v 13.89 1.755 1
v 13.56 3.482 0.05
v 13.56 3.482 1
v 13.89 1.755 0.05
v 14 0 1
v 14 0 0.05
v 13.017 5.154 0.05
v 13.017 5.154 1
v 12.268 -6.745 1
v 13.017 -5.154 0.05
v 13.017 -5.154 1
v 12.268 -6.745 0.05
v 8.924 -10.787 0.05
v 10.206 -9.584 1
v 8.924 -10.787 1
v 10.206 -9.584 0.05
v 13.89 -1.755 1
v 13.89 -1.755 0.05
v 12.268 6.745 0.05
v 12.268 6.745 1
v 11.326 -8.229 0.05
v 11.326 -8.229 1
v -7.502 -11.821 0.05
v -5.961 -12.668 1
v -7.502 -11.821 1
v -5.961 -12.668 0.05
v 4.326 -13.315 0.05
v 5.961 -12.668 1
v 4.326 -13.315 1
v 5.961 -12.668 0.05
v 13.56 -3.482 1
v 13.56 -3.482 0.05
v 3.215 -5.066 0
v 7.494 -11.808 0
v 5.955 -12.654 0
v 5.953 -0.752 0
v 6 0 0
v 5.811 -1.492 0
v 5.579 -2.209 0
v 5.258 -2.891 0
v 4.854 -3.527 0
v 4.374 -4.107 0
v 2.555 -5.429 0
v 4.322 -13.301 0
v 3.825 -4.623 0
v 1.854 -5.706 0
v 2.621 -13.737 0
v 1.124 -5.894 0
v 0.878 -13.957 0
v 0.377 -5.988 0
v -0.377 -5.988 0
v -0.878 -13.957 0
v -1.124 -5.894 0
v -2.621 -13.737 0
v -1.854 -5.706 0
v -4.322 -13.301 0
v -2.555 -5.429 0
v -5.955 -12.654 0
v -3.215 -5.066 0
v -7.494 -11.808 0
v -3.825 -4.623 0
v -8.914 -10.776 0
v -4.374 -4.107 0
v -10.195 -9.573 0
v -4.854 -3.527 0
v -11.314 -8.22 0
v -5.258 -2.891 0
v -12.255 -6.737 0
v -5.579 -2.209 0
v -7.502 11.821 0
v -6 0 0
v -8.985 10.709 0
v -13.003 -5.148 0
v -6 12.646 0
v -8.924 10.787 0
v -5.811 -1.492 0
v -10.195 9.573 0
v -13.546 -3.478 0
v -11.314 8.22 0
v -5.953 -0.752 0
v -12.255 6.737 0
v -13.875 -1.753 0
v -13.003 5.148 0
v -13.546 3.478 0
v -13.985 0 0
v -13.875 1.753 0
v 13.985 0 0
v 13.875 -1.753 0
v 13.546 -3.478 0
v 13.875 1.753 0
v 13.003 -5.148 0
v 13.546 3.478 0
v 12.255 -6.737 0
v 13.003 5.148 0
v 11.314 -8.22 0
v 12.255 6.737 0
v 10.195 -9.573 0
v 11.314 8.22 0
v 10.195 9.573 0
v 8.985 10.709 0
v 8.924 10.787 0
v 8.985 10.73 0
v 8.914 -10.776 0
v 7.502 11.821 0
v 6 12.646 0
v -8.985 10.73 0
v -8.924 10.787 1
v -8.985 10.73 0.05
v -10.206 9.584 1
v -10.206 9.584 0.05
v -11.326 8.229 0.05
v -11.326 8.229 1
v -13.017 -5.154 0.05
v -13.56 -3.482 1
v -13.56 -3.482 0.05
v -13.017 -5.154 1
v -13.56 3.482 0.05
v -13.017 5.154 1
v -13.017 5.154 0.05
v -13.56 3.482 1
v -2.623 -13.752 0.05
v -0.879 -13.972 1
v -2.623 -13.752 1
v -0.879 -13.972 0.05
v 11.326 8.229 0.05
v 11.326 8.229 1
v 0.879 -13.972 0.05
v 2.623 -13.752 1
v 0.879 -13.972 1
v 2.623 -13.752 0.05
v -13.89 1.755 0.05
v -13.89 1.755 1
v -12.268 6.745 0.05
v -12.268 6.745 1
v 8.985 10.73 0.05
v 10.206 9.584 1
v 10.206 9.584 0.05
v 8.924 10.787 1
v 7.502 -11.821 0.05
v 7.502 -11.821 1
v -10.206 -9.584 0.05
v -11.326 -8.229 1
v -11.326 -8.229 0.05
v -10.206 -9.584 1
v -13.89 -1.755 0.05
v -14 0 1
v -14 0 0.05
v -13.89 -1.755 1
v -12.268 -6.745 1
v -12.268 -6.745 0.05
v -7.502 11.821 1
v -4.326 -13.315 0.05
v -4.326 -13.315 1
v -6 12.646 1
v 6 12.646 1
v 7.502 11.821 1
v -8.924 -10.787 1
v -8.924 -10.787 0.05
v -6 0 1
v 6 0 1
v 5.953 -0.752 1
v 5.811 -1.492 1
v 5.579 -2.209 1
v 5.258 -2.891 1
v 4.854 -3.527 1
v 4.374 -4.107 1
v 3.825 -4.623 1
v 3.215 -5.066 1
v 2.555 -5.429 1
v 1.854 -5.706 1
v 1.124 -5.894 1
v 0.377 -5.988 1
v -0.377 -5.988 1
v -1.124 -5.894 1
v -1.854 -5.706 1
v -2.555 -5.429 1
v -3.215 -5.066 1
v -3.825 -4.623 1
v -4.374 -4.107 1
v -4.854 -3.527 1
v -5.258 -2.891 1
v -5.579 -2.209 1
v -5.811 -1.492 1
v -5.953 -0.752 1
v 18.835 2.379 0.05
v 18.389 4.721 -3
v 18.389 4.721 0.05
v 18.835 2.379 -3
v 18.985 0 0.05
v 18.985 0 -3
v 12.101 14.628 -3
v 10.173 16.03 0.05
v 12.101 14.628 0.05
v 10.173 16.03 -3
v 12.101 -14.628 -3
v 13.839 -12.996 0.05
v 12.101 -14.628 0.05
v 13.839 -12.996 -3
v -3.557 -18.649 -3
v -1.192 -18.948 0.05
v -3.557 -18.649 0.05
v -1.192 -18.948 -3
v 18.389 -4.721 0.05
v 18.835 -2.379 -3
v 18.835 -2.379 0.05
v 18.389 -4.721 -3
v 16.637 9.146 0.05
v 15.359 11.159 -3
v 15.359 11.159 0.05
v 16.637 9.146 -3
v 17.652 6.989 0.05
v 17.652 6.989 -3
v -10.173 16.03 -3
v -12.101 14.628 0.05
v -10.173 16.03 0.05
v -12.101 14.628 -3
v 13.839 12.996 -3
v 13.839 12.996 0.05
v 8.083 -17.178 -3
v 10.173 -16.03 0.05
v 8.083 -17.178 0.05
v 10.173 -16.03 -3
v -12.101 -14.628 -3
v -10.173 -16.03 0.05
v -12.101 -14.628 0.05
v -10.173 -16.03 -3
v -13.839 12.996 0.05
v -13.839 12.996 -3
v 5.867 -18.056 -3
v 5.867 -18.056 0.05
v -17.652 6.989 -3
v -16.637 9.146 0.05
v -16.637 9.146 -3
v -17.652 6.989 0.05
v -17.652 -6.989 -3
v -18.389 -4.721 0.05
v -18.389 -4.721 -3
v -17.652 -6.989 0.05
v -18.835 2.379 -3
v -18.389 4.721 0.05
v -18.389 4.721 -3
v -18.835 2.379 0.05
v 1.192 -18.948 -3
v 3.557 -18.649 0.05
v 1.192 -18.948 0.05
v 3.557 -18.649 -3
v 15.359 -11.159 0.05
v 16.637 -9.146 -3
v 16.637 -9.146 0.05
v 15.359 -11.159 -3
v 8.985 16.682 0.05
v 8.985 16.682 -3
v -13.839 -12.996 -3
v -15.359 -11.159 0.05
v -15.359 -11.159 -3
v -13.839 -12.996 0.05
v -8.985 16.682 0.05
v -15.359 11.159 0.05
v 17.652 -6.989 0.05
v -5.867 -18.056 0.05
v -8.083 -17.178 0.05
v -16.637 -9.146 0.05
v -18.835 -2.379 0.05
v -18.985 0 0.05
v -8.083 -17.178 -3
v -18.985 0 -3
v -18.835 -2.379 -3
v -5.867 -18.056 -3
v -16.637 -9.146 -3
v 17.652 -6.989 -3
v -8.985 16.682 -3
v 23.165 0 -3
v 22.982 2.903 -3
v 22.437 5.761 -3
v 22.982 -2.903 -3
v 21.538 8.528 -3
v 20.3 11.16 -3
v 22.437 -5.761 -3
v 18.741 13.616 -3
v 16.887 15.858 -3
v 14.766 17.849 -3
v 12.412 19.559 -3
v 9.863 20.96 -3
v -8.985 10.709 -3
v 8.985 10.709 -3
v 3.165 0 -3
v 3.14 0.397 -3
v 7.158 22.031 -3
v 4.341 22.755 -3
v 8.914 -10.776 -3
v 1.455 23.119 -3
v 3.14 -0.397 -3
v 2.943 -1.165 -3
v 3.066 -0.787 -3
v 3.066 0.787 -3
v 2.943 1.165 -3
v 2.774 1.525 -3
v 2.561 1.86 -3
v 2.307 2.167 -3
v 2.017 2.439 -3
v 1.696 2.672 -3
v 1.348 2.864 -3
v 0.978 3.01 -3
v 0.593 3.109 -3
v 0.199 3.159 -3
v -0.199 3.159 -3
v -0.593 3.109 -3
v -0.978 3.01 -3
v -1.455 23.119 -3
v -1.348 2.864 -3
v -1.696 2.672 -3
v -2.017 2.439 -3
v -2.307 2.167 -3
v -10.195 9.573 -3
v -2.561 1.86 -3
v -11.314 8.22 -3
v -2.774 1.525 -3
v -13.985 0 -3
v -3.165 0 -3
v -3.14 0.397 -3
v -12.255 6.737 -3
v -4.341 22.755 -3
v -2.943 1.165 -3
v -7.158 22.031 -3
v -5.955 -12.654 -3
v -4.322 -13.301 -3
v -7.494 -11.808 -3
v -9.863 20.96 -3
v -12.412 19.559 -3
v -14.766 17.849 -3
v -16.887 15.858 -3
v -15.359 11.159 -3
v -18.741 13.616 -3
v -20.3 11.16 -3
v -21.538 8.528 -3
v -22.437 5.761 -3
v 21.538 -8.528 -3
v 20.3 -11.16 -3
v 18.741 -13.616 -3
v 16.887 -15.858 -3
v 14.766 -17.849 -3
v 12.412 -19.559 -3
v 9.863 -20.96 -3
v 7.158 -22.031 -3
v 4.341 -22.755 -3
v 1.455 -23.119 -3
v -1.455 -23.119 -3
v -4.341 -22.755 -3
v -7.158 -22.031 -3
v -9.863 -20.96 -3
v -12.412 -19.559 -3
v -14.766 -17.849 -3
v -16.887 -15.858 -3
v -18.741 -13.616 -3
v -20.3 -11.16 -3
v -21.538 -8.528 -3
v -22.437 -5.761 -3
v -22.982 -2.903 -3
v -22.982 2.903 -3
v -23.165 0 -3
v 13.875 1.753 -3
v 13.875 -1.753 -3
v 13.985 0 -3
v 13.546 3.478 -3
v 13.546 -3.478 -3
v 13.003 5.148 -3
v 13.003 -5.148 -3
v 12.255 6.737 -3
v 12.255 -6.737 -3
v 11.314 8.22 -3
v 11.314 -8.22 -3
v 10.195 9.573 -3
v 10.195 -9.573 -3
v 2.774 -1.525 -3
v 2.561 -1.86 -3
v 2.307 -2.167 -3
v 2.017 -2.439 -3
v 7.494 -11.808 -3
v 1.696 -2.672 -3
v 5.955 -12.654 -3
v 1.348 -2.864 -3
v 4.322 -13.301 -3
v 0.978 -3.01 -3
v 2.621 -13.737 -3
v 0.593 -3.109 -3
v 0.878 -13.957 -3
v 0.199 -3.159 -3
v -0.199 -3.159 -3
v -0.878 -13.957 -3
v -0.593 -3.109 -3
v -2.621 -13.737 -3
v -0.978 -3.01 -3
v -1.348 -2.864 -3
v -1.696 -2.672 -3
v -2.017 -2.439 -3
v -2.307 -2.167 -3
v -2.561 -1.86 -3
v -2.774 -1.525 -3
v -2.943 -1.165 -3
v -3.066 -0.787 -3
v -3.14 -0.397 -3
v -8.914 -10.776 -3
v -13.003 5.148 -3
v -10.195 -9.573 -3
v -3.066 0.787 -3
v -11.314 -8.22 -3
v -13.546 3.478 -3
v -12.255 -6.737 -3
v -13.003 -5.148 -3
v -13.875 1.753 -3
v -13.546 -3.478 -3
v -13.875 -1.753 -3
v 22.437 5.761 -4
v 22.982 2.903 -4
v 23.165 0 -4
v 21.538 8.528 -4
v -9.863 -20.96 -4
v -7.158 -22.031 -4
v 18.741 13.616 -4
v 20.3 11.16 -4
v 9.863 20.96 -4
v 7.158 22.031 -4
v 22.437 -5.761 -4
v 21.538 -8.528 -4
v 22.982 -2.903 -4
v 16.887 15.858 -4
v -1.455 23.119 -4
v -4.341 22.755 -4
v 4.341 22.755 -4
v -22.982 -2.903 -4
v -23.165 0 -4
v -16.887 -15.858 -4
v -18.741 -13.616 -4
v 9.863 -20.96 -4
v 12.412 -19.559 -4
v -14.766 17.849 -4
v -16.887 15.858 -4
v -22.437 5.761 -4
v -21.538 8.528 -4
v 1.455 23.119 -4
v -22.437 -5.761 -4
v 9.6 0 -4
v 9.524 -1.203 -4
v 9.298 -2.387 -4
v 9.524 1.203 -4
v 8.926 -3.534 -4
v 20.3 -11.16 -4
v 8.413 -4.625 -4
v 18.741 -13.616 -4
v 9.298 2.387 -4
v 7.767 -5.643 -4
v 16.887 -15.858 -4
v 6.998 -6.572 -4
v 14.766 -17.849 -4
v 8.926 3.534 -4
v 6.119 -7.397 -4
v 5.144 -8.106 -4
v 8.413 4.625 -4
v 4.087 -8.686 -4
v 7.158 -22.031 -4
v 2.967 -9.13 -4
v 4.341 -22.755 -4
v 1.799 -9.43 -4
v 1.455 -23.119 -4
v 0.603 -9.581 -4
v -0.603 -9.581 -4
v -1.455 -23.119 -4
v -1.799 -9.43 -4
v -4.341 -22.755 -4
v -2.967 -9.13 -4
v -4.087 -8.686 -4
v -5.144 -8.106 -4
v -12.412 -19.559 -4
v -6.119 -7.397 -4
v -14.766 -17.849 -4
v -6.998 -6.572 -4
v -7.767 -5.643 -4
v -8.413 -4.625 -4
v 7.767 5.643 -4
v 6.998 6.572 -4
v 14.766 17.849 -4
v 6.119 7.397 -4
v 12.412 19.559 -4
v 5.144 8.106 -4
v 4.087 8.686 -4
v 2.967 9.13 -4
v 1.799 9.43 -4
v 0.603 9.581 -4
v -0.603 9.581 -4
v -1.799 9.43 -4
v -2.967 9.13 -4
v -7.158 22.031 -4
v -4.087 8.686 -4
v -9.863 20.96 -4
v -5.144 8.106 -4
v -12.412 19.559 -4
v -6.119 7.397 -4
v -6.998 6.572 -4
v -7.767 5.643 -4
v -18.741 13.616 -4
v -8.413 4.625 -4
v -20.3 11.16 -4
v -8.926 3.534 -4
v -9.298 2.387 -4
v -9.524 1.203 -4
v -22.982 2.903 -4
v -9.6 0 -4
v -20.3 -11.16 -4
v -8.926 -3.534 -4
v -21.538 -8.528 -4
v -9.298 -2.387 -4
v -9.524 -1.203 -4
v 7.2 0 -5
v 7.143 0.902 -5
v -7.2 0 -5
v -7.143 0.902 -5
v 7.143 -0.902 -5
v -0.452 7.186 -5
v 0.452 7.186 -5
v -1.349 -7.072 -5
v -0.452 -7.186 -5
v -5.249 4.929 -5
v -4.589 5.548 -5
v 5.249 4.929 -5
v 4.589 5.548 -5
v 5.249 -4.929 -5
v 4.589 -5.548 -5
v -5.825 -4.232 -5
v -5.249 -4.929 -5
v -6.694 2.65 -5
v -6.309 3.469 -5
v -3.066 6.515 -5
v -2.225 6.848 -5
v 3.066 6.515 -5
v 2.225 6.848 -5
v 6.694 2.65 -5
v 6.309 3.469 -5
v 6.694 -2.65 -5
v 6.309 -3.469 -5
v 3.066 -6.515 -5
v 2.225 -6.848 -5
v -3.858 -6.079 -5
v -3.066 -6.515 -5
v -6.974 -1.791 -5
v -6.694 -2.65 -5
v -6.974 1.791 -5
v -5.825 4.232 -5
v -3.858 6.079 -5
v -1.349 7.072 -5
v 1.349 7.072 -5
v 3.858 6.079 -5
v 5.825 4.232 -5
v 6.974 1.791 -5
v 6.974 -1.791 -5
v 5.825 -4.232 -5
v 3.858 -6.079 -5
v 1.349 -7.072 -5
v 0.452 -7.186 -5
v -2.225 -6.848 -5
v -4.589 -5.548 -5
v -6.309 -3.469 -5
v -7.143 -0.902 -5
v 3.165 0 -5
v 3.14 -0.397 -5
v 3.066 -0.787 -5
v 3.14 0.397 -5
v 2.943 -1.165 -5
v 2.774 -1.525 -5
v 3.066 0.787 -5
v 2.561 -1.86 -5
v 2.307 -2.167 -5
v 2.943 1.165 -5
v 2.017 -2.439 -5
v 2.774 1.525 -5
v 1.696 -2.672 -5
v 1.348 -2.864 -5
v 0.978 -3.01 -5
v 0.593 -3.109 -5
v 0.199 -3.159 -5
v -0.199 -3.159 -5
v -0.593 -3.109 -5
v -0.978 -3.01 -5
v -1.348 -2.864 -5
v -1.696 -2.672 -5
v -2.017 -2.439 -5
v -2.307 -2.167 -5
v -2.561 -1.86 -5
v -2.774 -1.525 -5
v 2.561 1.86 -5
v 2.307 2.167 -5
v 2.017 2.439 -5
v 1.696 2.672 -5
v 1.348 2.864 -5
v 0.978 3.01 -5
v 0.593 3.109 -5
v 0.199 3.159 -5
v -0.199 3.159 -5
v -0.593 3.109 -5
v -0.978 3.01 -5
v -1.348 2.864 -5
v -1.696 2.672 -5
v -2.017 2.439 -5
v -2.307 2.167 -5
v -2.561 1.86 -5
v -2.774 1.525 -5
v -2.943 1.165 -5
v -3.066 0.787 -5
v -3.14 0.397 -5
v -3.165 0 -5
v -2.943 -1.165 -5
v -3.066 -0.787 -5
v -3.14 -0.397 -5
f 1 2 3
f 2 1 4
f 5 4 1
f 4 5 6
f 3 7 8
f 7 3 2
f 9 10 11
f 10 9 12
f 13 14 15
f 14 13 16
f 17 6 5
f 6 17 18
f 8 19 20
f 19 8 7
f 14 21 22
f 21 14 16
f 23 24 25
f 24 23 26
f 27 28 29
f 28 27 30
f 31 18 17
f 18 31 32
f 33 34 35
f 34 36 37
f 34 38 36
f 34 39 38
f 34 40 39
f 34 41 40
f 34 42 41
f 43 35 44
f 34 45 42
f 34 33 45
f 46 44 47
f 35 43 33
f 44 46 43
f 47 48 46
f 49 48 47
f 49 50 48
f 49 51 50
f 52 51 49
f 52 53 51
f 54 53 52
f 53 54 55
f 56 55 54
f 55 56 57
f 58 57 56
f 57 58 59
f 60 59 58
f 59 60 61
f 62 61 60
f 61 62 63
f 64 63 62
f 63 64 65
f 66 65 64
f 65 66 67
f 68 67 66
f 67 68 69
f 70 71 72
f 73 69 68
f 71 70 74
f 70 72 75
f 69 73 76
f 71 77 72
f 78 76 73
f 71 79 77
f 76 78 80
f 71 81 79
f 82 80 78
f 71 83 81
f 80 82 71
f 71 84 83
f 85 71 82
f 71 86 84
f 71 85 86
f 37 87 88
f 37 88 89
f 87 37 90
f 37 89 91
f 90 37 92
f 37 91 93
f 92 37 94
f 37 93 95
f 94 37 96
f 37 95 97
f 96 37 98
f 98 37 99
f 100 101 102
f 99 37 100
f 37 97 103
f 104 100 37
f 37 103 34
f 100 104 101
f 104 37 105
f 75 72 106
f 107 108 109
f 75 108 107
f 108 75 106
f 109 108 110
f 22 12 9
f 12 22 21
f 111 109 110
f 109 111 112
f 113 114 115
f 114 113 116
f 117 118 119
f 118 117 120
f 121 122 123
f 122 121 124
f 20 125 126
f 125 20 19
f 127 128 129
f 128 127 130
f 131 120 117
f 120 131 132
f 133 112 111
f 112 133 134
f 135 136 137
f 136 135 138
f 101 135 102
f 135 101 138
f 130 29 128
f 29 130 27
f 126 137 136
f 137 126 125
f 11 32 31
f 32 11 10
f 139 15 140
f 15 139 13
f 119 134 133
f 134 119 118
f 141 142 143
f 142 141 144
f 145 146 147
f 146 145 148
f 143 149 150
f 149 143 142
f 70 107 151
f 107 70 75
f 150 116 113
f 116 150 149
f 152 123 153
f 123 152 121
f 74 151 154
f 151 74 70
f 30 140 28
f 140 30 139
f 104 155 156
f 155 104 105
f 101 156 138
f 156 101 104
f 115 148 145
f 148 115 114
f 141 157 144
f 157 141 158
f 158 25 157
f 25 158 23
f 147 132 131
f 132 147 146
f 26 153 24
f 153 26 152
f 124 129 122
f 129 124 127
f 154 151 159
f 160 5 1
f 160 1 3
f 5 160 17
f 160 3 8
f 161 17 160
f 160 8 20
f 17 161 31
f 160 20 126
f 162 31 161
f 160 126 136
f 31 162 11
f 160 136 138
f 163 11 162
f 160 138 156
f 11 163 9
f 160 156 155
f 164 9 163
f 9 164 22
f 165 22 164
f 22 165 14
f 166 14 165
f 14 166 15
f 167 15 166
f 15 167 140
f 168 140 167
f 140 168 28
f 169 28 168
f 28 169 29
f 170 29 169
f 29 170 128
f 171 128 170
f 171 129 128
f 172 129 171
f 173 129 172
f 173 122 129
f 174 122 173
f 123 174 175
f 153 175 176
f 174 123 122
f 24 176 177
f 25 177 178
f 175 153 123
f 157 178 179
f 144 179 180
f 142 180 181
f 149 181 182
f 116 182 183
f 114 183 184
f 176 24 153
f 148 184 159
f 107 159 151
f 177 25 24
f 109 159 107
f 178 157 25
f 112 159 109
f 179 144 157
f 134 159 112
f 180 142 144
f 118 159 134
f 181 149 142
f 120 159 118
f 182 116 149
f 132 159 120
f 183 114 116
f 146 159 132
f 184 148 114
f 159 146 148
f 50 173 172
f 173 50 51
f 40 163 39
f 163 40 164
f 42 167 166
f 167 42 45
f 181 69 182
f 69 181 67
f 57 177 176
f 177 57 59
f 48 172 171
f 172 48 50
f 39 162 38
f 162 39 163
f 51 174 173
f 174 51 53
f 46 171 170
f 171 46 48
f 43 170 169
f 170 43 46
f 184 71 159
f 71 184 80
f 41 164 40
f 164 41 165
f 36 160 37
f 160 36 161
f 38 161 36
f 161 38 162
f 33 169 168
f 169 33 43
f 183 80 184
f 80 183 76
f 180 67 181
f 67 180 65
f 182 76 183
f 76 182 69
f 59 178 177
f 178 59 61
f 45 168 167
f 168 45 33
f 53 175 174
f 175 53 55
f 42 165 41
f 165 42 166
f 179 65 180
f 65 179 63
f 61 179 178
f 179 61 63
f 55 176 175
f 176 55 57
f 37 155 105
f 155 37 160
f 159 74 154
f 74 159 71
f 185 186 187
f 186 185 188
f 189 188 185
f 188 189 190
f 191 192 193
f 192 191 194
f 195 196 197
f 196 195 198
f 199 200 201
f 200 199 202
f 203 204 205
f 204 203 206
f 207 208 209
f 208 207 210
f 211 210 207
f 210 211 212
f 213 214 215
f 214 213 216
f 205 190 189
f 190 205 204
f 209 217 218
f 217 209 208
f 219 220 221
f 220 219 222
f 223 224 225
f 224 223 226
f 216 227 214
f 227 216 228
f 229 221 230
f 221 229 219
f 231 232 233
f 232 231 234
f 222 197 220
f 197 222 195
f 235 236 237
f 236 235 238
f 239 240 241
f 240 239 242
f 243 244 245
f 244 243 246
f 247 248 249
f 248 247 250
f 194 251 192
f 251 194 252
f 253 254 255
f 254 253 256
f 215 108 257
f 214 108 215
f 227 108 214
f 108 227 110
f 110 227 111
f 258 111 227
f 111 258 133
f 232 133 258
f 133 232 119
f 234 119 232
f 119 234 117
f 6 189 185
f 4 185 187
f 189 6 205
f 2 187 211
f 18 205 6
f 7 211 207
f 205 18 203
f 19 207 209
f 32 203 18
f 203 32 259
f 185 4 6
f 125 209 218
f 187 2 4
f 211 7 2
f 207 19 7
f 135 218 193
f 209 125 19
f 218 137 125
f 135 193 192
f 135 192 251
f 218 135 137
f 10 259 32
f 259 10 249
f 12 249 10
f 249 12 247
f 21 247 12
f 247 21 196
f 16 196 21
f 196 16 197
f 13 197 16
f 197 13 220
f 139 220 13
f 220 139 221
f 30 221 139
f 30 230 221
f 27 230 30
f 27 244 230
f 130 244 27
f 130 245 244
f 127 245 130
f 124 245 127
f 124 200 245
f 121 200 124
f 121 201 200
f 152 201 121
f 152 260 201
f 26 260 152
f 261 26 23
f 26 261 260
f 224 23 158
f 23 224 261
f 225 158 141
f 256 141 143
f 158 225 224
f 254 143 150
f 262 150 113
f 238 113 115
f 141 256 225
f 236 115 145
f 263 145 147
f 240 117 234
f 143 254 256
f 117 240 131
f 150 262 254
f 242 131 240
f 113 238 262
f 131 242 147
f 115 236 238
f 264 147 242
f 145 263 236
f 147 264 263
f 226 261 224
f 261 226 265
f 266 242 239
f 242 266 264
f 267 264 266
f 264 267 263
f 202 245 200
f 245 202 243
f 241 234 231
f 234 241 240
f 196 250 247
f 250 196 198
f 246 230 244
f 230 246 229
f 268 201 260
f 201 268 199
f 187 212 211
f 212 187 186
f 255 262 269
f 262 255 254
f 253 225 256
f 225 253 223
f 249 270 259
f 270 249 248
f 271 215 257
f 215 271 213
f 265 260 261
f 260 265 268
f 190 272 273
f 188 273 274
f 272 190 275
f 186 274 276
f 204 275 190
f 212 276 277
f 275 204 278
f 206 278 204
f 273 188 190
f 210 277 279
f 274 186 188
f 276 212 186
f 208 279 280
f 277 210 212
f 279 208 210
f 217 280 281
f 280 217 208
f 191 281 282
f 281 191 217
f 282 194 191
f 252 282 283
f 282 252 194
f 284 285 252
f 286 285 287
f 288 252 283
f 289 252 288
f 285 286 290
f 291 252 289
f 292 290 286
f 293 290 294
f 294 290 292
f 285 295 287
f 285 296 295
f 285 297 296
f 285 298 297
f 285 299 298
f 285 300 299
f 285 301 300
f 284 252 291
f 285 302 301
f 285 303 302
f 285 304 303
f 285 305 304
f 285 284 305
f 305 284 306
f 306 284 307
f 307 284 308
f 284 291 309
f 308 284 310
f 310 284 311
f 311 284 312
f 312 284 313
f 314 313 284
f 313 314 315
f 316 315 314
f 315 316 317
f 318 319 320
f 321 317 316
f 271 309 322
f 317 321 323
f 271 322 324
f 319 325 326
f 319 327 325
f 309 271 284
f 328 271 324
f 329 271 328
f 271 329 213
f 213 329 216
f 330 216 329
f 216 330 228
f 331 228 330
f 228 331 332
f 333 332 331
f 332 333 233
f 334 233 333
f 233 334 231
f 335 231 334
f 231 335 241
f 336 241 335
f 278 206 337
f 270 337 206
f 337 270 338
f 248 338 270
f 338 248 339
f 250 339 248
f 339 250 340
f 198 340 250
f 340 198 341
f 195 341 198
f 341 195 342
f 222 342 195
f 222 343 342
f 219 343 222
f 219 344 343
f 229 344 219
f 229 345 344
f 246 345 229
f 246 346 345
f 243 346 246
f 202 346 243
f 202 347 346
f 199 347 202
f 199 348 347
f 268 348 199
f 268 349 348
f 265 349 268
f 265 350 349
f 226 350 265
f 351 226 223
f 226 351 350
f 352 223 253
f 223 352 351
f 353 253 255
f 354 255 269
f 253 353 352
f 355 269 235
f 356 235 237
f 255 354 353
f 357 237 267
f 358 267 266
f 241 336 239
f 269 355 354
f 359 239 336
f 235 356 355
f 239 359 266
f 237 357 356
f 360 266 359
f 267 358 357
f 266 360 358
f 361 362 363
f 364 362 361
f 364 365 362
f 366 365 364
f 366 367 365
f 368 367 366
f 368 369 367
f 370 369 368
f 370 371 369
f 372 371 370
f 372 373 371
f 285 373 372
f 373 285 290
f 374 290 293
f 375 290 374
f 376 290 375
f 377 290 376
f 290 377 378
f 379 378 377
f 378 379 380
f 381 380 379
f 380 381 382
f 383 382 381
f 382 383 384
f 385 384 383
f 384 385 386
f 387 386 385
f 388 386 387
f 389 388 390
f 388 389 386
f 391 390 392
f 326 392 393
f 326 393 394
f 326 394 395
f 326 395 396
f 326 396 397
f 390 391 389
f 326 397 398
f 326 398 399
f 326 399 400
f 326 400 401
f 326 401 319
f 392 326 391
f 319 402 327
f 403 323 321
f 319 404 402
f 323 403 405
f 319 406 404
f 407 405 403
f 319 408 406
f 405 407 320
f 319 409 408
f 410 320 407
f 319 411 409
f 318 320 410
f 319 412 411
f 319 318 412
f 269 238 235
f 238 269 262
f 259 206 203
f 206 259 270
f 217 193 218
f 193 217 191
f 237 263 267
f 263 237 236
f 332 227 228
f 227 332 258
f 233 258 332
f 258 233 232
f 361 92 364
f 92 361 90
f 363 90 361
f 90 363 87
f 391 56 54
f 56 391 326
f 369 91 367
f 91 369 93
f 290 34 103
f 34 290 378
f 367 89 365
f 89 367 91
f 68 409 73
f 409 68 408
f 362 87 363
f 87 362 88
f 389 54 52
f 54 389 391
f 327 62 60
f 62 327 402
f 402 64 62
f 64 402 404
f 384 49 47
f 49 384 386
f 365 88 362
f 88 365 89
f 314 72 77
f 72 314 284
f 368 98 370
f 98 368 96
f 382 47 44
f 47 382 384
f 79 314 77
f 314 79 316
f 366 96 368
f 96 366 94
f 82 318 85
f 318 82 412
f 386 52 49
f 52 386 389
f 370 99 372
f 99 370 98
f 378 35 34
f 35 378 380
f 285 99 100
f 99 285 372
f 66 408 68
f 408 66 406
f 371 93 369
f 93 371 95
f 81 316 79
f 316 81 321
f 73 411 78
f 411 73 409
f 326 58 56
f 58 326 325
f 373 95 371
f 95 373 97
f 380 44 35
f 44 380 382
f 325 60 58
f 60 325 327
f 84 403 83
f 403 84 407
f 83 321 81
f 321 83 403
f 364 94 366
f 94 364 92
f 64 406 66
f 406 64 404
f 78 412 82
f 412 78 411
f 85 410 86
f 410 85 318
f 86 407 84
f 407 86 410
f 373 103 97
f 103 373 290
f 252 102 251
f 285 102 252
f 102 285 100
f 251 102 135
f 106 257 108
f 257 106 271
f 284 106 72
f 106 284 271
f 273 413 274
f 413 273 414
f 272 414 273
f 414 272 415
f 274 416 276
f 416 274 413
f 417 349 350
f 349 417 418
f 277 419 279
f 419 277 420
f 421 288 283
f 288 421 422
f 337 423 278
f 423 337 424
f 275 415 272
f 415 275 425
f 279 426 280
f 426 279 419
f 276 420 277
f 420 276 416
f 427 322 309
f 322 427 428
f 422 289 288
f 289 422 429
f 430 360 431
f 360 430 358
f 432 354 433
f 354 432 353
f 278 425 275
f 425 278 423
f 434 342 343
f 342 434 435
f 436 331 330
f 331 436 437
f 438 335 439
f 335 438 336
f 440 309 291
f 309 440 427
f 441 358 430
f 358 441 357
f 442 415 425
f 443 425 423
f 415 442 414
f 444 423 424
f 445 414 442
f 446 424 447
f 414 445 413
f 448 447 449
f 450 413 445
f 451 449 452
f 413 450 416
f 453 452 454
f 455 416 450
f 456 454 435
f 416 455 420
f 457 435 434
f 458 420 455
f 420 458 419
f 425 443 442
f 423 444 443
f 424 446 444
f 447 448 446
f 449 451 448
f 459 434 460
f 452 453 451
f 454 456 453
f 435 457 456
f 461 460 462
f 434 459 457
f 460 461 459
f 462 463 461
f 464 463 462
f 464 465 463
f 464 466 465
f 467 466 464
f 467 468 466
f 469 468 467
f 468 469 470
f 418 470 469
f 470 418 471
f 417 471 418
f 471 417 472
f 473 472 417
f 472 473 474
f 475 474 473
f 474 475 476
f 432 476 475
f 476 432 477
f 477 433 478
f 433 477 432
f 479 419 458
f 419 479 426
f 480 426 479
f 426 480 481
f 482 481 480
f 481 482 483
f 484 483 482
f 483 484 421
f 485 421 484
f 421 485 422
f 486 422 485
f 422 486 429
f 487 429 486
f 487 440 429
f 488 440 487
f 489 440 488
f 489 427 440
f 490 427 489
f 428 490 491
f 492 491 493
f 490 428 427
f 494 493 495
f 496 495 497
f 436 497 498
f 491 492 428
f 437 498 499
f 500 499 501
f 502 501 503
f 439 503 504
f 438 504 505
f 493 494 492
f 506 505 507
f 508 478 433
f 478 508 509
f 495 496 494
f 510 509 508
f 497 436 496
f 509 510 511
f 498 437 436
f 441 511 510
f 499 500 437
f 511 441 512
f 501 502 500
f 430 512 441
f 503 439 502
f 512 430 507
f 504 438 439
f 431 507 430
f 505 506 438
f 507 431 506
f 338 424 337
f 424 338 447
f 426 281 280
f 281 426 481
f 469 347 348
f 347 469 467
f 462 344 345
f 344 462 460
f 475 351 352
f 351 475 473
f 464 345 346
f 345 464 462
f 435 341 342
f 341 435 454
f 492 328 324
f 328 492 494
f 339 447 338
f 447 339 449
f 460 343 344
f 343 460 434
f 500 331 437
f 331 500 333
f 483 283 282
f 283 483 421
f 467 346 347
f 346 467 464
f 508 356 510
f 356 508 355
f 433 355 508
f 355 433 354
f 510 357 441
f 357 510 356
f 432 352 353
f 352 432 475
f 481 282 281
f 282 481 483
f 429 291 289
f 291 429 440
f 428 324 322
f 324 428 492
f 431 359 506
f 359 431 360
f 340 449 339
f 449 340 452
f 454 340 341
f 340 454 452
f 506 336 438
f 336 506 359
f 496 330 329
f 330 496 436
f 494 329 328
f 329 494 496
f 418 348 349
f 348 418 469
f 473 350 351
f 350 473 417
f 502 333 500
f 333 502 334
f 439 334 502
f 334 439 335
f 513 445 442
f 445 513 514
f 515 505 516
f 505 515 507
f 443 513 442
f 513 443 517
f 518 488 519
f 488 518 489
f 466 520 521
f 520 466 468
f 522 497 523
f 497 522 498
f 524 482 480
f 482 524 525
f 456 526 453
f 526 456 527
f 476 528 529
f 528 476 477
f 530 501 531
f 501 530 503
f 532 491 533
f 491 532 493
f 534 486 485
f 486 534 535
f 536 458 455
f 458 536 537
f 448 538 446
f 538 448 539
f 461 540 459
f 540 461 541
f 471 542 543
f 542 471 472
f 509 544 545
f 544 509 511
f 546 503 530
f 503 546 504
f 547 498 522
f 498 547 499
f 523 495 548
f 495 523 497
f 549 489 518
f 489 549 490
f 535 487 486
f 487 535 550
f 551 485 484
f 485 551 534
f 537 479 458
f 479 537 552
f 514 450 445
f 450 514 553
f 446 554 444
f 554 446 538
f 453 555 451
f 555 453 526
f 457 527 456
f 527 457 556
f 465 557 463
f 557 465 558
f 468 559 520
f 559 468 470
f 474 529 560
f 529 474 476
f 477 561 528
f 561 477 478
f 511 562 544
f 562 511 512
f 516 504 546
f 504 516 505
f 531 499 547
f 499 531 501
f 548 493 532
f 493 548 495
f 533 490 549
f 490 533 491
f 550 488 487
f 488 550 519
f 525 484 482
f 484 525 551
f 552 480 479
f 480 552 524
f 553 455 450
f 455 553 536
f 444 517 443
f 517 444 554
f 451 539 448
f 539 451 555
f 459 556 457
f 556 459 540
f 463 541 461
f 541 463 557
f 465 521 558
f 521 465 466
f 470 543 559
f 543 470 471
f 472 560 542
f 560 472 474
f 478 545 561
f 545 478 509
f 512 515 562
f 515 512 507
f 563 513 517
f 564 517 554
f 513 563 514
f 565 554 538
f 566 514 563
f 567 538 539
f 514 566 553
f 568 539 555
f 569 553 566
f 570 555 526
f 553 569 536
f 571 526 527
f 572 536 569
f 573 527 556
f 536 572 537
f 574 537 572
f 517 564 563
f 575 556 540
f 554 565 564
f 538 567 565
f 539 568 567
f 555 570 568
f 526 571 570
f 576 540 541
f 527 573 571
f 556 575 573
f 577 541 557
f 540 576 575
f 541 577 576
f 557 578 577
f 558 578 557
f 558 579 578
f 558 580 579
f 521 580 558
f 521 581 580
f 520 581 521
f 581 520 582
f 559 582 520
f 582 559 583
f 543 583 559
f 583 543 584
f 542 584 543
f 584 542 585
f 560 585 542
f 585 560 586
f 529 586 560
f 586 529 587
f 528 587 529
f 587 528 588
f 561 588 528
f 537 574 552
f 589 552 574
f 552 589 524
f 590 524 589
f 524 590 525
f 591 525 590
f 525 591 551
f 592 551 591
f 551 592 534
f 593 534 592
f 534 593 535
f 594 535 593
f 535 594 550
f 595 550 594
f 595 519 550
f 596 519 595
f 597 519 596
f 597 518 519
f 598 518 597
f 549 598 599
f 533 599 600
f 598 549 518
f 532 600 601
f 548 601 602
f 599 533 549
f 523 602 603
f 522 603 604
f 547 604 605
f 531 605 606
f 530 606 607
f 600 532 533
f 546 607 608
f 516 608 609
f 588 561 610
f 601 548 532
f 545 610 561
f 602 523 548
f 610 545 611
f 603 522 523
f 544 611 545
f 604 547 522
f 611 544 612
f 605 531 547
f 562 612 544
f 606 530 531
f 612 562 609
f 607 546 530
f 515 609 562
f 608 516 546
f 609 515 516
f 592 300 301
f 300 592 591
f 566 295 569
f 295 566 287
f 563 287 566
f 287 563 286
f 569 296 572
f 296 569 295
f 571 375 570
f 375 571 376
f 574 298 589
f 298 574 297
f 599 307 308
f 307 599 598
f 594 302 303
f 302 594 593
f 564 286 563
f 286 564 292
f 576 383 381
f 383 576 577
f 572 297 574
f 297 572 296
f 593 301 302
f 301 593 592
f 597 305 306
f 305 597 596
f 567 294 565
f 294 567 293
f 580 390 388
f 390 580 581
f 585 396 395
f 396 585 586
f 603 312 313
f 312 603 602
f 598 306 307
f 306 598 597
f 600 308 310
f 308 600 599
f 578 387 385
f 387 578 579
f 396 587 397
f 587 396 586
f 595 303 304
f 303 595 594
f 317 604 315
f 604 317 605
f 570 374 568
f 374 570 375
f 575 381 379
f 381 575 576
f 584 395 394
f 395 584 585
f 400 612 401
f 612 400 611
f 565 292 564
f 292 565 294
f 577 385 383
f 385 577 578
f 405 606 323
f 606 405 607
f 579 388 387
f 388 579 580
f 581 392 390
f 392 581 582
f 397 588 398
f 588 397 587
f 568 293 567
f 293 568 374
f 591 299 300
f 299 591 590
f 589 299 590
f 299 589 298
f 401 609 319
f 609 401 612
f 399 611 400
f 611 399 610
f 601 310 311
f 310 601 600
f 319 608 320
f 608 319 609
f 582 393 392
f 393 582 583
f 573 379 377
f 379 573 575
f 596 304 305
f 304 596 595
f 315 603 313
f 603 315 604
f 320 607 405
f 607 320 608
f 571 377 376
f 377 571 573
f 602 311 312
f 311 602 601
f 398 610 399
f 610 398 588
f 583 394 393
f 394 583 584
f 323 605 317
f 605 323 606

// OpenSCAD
// file: fast_connect2.scad
include <manifold_parts.scad>

$fn = 150;

scale = 1.;
inch = 25.4 * scale;
mm = 1. * scale;
wall = .05 * inch;
radius = .5*inch;
or = wall + radius;
gap = .25*inch;
gap = 0.02 * inch;
/*tee(radius * .5, radius, wall);*/

w=1.4*mm;
chuck_radius = 8*mm;
cuff_clearance = 8*mm;
barb_length = 10*mm;

module chuck(w=w, chuck_radius=chuck_radius, cuff_clearance=cuff_clearance, barb_length=barb_length){
  difference(){
    scale(1/scale){
      taper(5.1*mm/2 - w, 4.8*mm/2 - w, 15*mm, w); // male connect
      translate([0,0,-w]){
	tube(w, w, chuck_radius - w);
	translate([0, 0, -cuff_clearance]){
	  tube(cuff_clearance, chuck_radius - w, w);
	  // translate([5.1*mm/2, 0, -4*mm/2])
	  translate([0*mm/2, 0, -4*mm/2])
	    rotate(-90, [0, 1, 0]){
	    //elbow(5.1*mm/2 - w, w);
	    rotate(180, [1, 0, 0]){
	      translate([0, 0, chuck_radius*mm])
		barb(4*mm/2 - w, 6*mm/2-w, barb_length, 3*mm, 2*mm, w);
	      taper(4.*mm/2 - w, 4.*mm/2 - w, chuck_radius, w); // male connect
	    }
	  }
	}
      }
      translate([0, 0, -cuff_clearance-w])
	scale([1, 1,.5])
	difference(){
	sphere(chuck_radius);
	translate([0, 0, chuck_radius])
	  cube(2*chuck_radius, 2*chuck_radius, 2*chuck_radius, center=true);
      }
    }
    translate([0,0, -cuff_clearance-w-4*mm/2-1*mm])
      cylinder(h=30, r=1*mm);
    translate([0,0, -4.2*mm-cuff_clearance+w/2])
      rotate(90, [0, 1, 0])
      cylinder(h=30, r=1*mm);
    // Slice
    /*
      rotate(90, [0,0, 1])
      translate([50, 0, 0])
      cube(100, 100, 100, center=true);
    */
  }
}
// chuck();
// file: manifold_parts.scad
module tube(height, radius, wall){
  difference(){
    cylinder(h=height, r=radius + wall);
    translate([0, 0, -1])
    cylinder(h=height+2, r=radius);
  }		
}

module washer(or, ir, h){
  tube(h, ir, or-ir);
}

module elb(radius, wall){
  d = 2 * (radius + wall);
  difference(){
    tube(sqrt(2) * (d), radius, wall);
    translate([radius + wall, -d, 0])rotate(45, [0, -1, 0])cube([d, 2*d, 2*d]);
  }
}
module elbow(radius, wall){
  union(){
    elb(radius, wall);
    translate([radius+wall, 0, radius + wall])
      rotate(90, [0, -1, 0])
      rotate(180, [0, 0, 1])
      elb(radius, wall);
  }
}

module tee(r1, r2, wall){
  difference(){
    union(){
      cylinder(h=(r2 + wall), r=r1+wall);
      translate([(r1 + wall), 0, (r2 + wall)])
	rotate(90, [0, -1, 0])
	cylinder(h=2*(r1 + wall), r=r2+wall);
    }
    translate([0, 0, -1])
    cylinder(h=(r2 + wall)+2, r=r1);
    translate([(r1 + wall), 0, (r2 + wall)])
      rotate(90, [0, -1, 0])
      translate([0, 0, -1])
      cylinder(h=2*(r1 + wall)+1, r=r2);
  }
}

module taper(r1, r2, h, wall){
  difference(){
    cylinder(r1=r1+wall, r2=r2+wall, h=h);
    cylinder(r1=r1, r2=r2, h=h);
  }
}

module eks(r1, r2, wall){
  difference(){
    union(){
      cylinder(h=2*(r2 + wall), r=r1+wall);
      translate([(r1 + wall), 0, (r2 + wall)])

	rotate(90, [0, -1, 0])
	cylinder(h=2*(r1 + wall), r=r2+wall);
    }
    cylinder(h=2*(r2 + wall), r=r1);
    translate([(r1 + wall), 0, (r2 + wall)])
    rotate(90, [0, -1, 0])
      cylinder(h=2*(r1 + wall), r=r2);
  }
}

/*
  r1 -- main tube inside radius 
  r2 -- fattest part barb inside radius
  h1 -- total height
  h2 -- height of barb
  h3 -- offset from top to start of barb
 */
module barb(r1, r2, h1, h2, h3, wall){
  union(){
    tube(h1, r1, wall);
    translate([0, 0, h1 - h2 - h3])
      taper(r2, r1, h2, wall);
  }
}
// main file
include <manifold_parts.scad>
include <fast_connect2.scad>


$fn = 50;

scale = 1.;
inch = 25.4 * scale;
mm = 1. * scale;
wall = .05 * inch;
radius = .5*inch;
or = wall + radius;
gap = .25*inch;
gap = 0.02 * inch;
/*tee(radius * .5, radius, wall);*/

w=1.4*mm;
chuck_thickness = 0.6*inch;
cuff_clearance = 5*mm;

// female
/*
translate([0, 0*.5*inch, .8*inch-3*mm])
scale(1/scale){
  difference(){
    tube(7*mm, 1*mm, w); // manifold-connect
    translate([0, 0, 6.25*mm])
    difference(){
      cylinder(h=1*mm + w, r1=1.1*mm + w, r2=1.1*mm+w);
      translate([0,0,-1*mm])
	cylinder(h=2*mm + w, r1=2*mm + w, r2=0.0*mm);
    }
  }
  translate([0, 0, -5 * mm])
  union(){
    taper(5.75*mm/2, 2*mm, 5*mm, w);
    tube(3*mm, 2*mm, w);
    translate([0, 0, -12.34 * mm])
      union(){
	tube(12.34 * mm, 5.75*mm/2, w);
	translate([0, 0, -3*mm])
	  tube(3*mm, 8.33*mm/2, 4.82*mm); // panel mount
	//translate([0, 0, -4.0*mm])
	  //color("blue")
	  //tube(1*mm, 6.33*mm/2, 5.82*mm); // o-ring holder
	
    }
  }
}
*/
x = 2*(8.33*mm/2 + 4.82*mm);

module flange_mount_old(){
  difference(){
    color([0, 1, 0, 1])
      tube(1*mm, 6*mm, 8*mm);
    translate([-6*mm, 0, -.1])
      cube([12*mm, 20*mm, 3.1*mm]);
  }
  translate([0, 0, -3*mm]){
    difference(){
      color("blue")
	tube(3.05*mm, 18.33*mm/2 + 4.82*mm, 5*mm); // panel mount
      translate([-x/2, 0, 0])
	cube([x, 20*mm, 3.1*mm]);
    }
  
    translate([0, 0, -1*mm])
      color("green")
      tube(1*mm, 16.33*mm/2, 15*mm); // panel mount
    translate([0, 0, -5*mm])
      difference(){
      cylinder(h=5*mm, r1=0*mm, r2=12*mm);
      cube([15*mm, 15*mm, 6*mm], center=true);
      cylinder(h=6*mm, r=6.33*mm/2);
    }
  }
}

// translate([0, 0, 
flange_mount_old();
//translate(
// chuck();
